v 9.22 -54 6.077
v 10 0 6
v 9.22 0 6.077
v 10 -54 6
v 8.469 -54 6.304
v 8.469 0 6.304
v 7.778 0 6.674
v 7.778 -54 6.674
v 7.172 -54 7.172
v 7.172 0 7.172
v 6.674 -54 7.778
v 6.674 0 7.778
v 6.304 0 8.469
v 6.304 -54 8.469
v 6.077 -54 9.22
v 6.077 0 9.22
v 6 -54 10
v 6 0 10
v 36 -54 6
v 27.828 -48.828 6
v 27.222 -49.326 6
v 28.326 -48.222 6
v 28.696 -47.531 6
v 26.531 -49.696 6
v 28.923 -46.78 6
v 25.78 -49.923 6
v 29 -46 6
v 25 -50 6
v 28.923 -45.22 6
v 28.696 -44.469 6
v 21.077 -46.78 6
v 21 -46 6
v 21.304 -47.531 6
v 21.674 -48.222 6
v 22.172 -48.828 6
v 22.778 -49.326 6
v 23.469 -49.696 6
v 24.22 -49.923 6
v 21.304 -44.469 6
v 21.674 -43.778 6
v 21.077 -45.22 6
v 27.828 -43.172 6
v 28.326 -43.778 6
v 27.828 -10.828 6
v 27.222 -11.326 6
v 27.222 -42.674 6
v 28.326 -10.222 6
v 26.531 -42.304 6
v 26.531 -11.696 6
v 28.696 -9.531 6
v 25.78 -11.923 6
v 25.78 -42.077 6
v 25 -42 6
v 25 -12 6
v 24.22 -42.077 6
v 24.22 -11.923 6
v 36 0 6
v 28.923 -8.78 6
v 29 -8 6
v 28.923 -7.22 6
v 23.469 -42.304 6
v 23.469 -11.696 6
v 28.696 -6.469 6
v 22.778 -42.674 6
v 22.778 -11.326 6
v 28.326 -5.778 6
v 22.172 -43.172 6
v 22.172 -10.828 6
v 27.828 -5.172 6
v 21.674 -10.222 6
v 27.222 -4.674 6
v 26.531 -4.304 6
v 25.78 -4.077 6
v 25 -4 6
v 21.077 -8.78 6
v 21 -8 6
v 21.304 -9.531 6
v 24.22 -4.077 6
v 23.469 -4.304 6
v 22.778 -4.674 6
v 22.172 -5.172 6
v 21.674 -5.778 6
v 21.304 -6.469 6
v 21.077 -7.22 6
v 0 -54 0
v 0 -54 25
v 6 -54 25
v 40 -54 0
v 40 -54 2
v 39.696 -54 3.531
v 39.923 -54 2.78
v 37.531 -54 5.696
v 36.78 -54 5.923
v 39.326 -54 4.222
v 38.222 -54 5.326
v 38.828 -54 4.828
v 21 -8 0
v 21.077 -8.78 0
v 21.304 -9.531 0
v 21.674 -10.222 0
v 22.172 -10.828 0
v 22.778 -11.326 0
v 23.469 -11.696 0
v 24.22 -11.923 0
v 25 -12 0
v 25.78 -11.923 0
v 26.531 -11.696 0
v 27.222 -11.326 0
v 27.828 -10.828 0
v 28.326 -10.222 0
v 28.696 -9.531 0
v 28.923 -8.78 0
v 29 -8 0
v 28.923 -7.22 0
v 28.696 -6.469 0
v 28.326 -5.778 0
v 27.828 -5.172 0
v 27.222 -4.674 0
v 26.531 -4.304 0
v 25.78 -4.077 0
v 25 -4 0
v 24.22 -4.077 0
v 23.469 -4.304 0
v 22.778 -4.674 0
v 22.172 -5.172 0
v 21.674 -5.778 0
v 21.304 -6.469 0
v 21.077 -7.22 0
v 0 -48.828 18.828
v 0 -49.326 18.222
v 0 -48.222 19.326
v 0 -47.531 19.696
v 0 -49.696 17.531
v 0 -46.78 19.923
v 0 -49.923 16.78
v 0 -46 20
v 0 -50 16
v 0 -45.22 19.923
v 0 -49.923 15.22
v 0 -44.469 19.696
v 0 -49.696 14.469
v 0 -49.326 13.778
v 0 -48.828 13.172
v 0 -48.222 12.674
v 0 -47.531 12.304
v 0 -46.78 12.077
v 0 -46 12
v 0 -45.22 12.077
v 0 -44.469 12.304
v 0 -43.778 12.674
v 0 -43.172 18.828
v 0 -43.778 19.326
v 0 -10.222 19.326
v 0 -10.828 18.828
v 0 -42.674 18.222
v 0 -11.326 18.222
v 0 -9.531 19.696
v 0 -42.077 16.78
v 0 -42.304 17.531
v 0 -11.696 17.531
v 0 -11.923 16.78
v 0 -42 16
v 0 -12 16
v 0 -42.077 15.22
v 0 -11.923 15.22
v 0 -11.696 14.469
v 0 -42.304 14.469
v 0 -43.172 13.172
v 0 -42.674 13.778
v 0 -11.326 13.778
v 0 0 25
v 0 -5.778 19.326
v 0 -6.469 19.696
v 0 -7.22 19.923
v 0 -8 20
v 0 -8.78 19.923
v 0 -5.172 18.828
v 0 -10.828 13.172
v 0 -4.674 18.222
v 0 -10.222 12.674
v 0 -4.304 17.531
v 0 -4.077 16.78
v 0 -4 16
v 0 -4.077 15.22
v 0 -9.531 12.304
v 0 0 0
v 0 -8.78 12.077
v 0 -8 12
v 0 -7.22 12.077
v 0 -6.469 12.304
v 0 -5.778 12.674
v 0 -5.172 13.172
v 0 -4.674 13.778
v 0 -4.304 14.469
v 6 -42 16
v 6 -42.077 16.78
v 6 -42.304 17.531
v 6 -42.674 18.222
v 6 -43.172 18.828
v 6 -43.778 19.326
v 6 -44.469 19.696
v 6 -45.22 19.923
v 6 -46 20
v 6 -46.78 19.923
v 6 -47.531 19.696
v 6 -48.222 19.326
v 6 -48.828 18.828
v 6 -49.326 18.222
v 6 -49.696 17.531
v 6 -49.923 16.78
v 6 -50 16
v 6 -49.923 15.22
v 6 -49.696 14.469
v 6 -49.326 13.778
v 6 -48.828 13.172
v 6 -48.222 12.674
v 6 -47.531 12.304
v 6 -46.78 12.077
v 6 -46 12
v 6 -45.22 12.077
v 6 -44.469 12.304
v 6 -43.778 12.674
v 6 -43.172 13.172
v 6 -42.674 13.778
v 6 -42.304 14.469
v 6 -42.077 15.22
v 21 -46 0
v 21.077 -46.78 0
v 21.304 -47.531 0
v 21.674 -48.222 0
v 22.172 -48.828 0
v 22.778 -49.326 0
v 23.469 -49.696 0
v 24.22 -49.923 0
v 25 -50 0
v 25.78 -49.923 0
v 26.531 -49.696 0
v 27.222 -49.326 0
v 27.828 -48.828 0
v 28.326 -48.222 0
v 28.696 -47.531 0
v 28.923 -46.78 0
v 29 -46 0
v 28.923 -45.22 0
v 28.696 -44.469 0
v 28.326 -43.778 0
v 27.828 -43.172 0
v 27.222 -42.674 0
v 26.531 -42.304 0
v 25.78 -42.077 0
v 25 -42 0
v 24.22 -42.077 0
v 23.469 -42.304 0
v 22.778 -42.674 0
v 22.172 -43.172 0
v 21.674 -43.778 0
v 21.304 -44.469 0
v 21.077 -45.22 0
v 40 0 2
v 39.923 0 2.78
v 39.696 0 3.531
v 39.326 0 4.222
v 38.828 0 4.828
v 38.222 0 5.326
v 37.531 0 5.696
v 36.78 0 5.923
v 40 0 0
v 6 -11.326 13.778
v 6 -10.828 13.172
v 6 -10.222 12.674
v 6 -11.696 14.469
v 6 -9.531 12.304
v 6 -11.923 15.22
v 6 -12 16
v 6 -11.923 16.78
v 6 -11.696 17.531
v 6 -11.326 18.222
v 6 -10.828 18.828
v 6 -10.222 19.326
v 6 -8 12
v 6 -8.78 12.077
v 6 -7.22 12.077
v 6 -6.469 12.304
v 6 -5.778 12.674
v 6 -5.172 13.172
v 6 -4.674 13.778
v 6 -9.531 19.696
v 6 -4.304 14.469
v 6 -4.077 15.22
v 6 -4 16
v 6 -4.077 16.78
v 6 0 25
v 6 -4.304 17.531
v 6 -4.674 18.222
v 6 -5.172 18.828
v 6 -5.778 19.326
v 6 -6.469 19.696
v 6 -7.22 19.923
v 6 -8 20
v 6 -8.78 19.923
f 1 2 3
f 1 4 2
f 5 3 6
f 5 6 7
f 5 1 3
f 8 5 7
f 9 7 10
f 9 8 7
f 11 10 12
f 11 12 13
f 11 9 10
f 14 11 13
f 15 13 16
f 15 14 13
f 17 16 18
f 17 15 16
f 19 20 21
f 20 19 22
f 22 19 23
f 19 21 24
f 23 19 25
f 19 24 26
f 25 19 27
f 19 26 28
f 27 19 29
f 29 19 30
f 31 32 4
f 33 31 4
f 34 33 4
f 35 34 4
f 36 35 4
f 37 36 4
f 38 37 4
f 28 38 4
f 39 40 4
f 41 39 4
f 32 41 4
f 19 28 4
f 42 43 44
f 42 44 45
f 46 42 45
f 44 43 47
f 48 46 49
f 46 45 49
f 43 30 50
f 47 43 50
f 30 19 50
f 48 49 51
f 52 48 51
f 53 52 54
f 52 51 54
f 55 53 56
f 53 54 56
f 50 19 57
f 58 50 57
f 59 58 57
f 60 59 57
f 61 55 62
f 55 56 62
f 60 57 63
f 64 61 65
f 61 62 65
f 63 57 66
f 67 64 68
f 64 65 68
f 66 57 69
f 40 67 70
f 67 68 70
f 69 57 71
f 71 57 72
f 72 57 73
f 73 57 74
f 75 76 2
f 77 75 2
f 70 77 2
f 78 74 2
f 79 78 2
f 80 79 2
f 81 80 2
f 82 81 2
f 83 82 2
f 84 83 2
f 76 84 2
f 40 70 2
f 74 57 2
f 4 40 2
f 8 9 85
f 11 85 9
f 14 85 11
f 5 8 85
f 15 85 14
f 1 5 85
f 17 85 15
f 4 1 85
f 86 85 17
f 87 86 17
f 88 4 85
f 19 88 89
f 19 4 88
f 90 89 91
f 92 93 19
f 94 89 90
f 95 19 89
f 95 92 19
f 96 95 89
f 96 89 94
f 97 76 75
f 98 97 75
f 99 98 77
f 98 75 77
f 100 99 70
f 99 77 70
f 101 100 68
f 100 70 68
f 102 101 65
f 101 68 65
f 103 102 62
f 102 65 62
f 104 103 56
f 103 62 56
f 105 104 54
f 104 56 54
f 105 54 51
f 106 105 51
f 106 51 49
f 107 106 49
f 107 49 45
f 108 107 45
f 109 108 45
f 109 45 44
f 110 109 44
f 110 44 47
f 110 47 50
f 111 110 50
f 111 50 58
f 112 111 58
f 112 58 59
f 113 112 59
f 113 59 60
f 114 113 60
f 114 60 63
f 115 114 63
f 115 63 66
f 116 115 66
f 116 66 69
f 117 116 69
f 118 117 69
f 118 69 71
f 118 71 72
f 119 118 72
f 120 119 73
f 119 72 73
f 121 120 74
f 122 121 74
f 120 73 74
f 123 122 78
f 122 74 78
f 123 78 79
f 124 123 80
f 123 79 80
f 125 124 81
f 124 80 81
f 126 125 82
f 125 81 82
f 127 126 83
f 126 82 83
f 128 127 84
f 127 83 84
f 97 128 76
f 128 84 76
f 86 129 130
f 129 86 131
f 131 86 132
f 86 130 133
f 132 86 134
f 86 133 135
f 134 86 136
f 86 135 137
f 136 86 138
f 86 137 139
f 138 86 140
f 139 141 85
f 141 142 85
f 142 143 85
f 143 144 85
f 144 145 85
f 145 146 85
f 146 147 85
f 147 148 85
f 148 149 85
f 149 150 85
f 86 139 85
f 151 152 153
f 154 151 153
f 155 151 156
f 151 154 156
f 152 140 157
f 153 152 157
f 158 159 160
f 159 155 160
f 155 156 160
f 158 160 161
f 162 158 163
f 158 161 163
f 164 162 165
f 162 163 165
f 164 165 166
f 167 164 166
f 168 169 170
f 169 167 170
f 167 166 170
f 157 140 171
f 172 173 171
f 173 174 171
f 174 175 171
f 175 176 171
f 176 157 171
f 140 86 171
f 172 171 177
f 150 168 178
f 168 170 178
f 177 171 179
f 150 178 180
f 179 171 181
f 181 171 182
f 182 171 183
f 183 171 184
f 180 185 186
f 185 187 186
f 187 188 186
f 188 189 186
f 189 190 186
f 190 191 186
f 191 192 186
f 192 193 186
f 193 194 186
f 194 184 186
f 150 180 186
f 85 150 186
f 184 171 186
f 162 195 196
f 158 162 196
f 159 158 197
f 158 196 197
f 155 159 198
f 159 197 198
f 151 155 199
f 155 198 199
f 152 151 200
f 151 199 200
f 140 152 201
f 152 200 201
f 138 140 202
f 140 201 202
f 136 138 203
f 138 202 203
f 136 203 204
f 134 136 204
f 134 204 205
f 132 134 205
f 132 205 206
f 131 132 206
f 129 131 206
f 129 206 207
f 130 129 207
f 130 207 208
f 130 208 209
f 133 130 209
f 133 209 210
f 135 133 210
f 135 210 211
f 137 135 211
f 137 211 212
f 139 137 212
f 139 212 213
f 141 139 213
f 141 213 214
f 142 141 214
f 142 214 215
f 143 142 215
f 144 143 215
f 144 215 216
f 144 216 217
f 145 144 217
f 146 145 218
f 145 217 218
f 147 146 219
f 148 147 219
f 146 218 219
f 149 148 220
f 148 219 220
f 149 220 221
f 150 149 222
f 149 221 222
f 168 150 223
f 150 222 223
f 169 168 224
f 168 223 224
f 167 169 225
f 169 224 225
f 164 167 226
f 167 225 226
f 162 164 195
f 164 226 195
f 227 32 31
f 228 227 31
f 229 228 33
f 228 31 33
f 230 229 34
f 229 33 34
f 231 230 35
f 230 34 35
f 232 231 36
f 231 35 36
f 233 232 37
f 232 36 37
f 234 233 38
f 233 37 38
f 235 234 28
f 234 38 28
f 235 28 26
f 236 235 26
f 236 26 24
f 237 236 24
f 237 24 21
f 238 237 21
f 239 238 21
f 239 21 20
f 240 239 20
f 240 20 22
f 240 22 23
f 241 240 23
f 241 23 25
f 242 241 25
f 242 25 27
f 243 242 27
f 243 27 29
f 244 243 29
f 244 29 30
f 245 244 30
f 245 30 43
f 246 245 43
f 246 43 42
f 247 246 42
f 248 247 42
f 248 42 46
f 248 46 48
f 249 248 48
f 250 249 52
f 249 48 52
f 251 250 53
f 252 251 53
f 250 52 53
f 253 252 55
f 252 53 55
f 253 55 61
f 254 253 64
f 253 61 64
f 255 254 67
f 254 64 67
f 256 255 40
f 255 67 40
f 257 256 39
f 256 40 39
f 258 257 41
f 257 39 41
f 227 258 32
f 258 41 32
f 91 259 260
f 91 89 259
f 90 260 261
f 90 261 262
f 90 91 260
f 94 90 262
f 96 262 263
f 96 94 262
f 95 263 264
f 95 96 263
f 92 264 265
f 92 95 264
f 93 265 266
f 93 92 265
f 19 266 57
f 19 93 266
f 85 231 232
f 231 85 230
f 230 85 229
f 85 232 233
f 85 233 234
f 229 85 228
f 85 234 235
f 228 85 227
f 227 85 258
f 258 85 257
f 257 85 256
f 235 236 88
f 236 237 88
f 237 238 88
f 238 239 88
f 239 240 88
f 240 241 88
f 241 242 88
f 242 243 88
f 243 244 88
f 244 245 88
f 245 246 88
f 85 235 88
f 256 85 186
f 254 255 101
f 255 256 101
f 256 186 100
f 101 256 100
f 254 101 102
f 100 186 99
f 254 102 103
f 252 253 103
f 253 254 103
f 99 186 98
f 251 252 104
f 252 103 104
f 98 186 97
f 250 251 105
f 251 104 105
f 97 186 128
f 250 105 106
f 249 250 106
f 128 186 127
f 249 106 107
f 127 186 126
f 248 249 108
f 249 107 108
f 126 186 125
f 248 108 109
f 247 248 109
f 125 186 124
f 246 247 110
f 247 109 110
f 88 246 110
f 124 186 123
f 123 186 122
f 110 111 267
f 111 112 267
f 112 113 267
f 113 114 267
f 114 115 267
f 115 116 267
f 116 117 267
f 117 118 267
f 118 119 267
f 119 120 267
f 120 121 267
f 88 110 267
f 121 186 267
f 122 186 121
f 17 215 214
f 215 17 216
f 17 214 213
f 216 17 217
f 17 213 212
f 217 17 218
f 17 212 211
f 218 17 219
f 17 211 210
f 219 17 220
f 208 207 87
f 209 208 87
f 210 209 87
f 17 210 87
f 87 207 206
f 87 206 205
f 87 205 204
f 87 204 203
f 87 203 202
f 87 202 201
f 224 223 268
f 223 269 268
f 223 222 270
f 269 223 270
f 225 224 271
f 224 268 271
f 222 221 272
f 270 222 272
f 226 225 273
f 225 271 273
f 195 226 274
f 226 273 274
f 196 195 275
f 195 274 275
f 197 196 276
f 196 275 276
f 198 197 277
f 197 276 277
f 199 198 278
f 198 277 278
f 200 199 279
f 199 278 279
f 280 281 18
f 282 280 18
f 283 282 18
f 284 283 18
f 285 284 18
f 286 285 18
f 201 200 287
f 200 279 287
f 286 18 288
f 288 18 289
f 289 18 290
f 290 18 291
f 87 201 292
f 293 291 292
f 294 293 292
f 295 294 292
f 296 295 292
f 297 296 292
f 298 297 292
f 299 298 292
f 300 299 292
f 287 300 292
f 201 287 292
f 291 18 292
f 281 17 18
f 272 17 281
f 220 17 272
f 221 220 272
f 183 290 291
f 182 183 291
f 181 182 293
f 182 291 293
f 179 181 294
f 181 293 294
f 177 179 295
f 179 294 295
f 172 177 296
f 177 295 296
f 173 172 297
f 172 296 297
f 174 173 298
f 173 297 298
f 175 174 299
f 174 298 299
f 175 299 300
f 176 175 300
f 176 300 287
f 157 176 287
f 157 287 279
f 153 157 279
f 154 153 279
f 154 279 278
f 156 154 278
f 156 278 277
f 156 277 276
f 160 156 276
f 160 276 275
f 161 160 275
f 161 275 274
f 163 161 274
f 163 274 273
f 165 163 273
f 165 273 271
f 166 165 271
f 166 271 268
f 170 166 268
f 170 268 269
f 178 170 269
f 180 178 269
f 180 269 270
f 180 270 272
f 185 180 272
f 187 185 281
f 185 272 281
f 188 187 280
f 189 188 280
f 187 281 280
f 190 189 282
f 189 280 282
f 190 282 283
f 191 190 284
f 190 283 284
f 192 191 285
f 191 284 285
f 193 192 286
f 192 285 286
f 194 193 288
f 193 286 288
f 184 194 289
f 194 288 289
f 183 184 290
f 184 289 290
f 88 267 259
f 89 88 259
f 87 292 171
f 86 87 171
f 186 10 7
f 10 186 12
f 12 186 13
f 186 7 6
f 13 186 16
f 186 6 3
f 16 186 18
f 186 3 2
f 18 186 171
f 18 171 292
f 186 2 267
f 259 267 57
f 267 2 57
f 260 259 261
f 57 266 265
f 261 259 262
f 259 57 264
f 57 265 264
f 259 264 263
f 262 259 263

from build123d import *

# Parameters (mm, degrees)
F1_DEPTH = 54
F2_R     = 4
F4_D     = 8
F4_DEPTH = 25
F6_D     = 8
F6_DEPTH = 25


with BuildPart() as f1:
    # F0 (on Front) → F1 (new body)
    with BuildSketch(Plane.XZ):
        Polygon((0, 25), (0, 0), (40, 0), (40, 6), (6, 6), (6, 25), align=None)
    extrude(amount=F1_DEPTH)

    # F2
    f2_edges = [f1.edges().sort_by_distance(p)[0] for p in [
        (40, -27, 6),
        (6, -27, 6),
    ]]
    fillet(f2_edges, radius=F2_R)

    # F4
    with Locations(Plane(origin=(0, 0, 0), x_dir=(0, -1, 0), z_dir=(-1, 0, 0))):
        with Locations((8, 16), (46, 16)):
            Hole(F4_D / 2, depth=F4_DEPTH)

    # F6
    with Locations(Plane(origin=(0, 0, 0), x_dir=(1, 0, 0), z_dir=(0, 0, -1))):
        with Locations((25, 8), (25, 46), (25, 46)):
            Hole(F6_D / 2, depth=F6_DEPTH)


solid = f1.part
